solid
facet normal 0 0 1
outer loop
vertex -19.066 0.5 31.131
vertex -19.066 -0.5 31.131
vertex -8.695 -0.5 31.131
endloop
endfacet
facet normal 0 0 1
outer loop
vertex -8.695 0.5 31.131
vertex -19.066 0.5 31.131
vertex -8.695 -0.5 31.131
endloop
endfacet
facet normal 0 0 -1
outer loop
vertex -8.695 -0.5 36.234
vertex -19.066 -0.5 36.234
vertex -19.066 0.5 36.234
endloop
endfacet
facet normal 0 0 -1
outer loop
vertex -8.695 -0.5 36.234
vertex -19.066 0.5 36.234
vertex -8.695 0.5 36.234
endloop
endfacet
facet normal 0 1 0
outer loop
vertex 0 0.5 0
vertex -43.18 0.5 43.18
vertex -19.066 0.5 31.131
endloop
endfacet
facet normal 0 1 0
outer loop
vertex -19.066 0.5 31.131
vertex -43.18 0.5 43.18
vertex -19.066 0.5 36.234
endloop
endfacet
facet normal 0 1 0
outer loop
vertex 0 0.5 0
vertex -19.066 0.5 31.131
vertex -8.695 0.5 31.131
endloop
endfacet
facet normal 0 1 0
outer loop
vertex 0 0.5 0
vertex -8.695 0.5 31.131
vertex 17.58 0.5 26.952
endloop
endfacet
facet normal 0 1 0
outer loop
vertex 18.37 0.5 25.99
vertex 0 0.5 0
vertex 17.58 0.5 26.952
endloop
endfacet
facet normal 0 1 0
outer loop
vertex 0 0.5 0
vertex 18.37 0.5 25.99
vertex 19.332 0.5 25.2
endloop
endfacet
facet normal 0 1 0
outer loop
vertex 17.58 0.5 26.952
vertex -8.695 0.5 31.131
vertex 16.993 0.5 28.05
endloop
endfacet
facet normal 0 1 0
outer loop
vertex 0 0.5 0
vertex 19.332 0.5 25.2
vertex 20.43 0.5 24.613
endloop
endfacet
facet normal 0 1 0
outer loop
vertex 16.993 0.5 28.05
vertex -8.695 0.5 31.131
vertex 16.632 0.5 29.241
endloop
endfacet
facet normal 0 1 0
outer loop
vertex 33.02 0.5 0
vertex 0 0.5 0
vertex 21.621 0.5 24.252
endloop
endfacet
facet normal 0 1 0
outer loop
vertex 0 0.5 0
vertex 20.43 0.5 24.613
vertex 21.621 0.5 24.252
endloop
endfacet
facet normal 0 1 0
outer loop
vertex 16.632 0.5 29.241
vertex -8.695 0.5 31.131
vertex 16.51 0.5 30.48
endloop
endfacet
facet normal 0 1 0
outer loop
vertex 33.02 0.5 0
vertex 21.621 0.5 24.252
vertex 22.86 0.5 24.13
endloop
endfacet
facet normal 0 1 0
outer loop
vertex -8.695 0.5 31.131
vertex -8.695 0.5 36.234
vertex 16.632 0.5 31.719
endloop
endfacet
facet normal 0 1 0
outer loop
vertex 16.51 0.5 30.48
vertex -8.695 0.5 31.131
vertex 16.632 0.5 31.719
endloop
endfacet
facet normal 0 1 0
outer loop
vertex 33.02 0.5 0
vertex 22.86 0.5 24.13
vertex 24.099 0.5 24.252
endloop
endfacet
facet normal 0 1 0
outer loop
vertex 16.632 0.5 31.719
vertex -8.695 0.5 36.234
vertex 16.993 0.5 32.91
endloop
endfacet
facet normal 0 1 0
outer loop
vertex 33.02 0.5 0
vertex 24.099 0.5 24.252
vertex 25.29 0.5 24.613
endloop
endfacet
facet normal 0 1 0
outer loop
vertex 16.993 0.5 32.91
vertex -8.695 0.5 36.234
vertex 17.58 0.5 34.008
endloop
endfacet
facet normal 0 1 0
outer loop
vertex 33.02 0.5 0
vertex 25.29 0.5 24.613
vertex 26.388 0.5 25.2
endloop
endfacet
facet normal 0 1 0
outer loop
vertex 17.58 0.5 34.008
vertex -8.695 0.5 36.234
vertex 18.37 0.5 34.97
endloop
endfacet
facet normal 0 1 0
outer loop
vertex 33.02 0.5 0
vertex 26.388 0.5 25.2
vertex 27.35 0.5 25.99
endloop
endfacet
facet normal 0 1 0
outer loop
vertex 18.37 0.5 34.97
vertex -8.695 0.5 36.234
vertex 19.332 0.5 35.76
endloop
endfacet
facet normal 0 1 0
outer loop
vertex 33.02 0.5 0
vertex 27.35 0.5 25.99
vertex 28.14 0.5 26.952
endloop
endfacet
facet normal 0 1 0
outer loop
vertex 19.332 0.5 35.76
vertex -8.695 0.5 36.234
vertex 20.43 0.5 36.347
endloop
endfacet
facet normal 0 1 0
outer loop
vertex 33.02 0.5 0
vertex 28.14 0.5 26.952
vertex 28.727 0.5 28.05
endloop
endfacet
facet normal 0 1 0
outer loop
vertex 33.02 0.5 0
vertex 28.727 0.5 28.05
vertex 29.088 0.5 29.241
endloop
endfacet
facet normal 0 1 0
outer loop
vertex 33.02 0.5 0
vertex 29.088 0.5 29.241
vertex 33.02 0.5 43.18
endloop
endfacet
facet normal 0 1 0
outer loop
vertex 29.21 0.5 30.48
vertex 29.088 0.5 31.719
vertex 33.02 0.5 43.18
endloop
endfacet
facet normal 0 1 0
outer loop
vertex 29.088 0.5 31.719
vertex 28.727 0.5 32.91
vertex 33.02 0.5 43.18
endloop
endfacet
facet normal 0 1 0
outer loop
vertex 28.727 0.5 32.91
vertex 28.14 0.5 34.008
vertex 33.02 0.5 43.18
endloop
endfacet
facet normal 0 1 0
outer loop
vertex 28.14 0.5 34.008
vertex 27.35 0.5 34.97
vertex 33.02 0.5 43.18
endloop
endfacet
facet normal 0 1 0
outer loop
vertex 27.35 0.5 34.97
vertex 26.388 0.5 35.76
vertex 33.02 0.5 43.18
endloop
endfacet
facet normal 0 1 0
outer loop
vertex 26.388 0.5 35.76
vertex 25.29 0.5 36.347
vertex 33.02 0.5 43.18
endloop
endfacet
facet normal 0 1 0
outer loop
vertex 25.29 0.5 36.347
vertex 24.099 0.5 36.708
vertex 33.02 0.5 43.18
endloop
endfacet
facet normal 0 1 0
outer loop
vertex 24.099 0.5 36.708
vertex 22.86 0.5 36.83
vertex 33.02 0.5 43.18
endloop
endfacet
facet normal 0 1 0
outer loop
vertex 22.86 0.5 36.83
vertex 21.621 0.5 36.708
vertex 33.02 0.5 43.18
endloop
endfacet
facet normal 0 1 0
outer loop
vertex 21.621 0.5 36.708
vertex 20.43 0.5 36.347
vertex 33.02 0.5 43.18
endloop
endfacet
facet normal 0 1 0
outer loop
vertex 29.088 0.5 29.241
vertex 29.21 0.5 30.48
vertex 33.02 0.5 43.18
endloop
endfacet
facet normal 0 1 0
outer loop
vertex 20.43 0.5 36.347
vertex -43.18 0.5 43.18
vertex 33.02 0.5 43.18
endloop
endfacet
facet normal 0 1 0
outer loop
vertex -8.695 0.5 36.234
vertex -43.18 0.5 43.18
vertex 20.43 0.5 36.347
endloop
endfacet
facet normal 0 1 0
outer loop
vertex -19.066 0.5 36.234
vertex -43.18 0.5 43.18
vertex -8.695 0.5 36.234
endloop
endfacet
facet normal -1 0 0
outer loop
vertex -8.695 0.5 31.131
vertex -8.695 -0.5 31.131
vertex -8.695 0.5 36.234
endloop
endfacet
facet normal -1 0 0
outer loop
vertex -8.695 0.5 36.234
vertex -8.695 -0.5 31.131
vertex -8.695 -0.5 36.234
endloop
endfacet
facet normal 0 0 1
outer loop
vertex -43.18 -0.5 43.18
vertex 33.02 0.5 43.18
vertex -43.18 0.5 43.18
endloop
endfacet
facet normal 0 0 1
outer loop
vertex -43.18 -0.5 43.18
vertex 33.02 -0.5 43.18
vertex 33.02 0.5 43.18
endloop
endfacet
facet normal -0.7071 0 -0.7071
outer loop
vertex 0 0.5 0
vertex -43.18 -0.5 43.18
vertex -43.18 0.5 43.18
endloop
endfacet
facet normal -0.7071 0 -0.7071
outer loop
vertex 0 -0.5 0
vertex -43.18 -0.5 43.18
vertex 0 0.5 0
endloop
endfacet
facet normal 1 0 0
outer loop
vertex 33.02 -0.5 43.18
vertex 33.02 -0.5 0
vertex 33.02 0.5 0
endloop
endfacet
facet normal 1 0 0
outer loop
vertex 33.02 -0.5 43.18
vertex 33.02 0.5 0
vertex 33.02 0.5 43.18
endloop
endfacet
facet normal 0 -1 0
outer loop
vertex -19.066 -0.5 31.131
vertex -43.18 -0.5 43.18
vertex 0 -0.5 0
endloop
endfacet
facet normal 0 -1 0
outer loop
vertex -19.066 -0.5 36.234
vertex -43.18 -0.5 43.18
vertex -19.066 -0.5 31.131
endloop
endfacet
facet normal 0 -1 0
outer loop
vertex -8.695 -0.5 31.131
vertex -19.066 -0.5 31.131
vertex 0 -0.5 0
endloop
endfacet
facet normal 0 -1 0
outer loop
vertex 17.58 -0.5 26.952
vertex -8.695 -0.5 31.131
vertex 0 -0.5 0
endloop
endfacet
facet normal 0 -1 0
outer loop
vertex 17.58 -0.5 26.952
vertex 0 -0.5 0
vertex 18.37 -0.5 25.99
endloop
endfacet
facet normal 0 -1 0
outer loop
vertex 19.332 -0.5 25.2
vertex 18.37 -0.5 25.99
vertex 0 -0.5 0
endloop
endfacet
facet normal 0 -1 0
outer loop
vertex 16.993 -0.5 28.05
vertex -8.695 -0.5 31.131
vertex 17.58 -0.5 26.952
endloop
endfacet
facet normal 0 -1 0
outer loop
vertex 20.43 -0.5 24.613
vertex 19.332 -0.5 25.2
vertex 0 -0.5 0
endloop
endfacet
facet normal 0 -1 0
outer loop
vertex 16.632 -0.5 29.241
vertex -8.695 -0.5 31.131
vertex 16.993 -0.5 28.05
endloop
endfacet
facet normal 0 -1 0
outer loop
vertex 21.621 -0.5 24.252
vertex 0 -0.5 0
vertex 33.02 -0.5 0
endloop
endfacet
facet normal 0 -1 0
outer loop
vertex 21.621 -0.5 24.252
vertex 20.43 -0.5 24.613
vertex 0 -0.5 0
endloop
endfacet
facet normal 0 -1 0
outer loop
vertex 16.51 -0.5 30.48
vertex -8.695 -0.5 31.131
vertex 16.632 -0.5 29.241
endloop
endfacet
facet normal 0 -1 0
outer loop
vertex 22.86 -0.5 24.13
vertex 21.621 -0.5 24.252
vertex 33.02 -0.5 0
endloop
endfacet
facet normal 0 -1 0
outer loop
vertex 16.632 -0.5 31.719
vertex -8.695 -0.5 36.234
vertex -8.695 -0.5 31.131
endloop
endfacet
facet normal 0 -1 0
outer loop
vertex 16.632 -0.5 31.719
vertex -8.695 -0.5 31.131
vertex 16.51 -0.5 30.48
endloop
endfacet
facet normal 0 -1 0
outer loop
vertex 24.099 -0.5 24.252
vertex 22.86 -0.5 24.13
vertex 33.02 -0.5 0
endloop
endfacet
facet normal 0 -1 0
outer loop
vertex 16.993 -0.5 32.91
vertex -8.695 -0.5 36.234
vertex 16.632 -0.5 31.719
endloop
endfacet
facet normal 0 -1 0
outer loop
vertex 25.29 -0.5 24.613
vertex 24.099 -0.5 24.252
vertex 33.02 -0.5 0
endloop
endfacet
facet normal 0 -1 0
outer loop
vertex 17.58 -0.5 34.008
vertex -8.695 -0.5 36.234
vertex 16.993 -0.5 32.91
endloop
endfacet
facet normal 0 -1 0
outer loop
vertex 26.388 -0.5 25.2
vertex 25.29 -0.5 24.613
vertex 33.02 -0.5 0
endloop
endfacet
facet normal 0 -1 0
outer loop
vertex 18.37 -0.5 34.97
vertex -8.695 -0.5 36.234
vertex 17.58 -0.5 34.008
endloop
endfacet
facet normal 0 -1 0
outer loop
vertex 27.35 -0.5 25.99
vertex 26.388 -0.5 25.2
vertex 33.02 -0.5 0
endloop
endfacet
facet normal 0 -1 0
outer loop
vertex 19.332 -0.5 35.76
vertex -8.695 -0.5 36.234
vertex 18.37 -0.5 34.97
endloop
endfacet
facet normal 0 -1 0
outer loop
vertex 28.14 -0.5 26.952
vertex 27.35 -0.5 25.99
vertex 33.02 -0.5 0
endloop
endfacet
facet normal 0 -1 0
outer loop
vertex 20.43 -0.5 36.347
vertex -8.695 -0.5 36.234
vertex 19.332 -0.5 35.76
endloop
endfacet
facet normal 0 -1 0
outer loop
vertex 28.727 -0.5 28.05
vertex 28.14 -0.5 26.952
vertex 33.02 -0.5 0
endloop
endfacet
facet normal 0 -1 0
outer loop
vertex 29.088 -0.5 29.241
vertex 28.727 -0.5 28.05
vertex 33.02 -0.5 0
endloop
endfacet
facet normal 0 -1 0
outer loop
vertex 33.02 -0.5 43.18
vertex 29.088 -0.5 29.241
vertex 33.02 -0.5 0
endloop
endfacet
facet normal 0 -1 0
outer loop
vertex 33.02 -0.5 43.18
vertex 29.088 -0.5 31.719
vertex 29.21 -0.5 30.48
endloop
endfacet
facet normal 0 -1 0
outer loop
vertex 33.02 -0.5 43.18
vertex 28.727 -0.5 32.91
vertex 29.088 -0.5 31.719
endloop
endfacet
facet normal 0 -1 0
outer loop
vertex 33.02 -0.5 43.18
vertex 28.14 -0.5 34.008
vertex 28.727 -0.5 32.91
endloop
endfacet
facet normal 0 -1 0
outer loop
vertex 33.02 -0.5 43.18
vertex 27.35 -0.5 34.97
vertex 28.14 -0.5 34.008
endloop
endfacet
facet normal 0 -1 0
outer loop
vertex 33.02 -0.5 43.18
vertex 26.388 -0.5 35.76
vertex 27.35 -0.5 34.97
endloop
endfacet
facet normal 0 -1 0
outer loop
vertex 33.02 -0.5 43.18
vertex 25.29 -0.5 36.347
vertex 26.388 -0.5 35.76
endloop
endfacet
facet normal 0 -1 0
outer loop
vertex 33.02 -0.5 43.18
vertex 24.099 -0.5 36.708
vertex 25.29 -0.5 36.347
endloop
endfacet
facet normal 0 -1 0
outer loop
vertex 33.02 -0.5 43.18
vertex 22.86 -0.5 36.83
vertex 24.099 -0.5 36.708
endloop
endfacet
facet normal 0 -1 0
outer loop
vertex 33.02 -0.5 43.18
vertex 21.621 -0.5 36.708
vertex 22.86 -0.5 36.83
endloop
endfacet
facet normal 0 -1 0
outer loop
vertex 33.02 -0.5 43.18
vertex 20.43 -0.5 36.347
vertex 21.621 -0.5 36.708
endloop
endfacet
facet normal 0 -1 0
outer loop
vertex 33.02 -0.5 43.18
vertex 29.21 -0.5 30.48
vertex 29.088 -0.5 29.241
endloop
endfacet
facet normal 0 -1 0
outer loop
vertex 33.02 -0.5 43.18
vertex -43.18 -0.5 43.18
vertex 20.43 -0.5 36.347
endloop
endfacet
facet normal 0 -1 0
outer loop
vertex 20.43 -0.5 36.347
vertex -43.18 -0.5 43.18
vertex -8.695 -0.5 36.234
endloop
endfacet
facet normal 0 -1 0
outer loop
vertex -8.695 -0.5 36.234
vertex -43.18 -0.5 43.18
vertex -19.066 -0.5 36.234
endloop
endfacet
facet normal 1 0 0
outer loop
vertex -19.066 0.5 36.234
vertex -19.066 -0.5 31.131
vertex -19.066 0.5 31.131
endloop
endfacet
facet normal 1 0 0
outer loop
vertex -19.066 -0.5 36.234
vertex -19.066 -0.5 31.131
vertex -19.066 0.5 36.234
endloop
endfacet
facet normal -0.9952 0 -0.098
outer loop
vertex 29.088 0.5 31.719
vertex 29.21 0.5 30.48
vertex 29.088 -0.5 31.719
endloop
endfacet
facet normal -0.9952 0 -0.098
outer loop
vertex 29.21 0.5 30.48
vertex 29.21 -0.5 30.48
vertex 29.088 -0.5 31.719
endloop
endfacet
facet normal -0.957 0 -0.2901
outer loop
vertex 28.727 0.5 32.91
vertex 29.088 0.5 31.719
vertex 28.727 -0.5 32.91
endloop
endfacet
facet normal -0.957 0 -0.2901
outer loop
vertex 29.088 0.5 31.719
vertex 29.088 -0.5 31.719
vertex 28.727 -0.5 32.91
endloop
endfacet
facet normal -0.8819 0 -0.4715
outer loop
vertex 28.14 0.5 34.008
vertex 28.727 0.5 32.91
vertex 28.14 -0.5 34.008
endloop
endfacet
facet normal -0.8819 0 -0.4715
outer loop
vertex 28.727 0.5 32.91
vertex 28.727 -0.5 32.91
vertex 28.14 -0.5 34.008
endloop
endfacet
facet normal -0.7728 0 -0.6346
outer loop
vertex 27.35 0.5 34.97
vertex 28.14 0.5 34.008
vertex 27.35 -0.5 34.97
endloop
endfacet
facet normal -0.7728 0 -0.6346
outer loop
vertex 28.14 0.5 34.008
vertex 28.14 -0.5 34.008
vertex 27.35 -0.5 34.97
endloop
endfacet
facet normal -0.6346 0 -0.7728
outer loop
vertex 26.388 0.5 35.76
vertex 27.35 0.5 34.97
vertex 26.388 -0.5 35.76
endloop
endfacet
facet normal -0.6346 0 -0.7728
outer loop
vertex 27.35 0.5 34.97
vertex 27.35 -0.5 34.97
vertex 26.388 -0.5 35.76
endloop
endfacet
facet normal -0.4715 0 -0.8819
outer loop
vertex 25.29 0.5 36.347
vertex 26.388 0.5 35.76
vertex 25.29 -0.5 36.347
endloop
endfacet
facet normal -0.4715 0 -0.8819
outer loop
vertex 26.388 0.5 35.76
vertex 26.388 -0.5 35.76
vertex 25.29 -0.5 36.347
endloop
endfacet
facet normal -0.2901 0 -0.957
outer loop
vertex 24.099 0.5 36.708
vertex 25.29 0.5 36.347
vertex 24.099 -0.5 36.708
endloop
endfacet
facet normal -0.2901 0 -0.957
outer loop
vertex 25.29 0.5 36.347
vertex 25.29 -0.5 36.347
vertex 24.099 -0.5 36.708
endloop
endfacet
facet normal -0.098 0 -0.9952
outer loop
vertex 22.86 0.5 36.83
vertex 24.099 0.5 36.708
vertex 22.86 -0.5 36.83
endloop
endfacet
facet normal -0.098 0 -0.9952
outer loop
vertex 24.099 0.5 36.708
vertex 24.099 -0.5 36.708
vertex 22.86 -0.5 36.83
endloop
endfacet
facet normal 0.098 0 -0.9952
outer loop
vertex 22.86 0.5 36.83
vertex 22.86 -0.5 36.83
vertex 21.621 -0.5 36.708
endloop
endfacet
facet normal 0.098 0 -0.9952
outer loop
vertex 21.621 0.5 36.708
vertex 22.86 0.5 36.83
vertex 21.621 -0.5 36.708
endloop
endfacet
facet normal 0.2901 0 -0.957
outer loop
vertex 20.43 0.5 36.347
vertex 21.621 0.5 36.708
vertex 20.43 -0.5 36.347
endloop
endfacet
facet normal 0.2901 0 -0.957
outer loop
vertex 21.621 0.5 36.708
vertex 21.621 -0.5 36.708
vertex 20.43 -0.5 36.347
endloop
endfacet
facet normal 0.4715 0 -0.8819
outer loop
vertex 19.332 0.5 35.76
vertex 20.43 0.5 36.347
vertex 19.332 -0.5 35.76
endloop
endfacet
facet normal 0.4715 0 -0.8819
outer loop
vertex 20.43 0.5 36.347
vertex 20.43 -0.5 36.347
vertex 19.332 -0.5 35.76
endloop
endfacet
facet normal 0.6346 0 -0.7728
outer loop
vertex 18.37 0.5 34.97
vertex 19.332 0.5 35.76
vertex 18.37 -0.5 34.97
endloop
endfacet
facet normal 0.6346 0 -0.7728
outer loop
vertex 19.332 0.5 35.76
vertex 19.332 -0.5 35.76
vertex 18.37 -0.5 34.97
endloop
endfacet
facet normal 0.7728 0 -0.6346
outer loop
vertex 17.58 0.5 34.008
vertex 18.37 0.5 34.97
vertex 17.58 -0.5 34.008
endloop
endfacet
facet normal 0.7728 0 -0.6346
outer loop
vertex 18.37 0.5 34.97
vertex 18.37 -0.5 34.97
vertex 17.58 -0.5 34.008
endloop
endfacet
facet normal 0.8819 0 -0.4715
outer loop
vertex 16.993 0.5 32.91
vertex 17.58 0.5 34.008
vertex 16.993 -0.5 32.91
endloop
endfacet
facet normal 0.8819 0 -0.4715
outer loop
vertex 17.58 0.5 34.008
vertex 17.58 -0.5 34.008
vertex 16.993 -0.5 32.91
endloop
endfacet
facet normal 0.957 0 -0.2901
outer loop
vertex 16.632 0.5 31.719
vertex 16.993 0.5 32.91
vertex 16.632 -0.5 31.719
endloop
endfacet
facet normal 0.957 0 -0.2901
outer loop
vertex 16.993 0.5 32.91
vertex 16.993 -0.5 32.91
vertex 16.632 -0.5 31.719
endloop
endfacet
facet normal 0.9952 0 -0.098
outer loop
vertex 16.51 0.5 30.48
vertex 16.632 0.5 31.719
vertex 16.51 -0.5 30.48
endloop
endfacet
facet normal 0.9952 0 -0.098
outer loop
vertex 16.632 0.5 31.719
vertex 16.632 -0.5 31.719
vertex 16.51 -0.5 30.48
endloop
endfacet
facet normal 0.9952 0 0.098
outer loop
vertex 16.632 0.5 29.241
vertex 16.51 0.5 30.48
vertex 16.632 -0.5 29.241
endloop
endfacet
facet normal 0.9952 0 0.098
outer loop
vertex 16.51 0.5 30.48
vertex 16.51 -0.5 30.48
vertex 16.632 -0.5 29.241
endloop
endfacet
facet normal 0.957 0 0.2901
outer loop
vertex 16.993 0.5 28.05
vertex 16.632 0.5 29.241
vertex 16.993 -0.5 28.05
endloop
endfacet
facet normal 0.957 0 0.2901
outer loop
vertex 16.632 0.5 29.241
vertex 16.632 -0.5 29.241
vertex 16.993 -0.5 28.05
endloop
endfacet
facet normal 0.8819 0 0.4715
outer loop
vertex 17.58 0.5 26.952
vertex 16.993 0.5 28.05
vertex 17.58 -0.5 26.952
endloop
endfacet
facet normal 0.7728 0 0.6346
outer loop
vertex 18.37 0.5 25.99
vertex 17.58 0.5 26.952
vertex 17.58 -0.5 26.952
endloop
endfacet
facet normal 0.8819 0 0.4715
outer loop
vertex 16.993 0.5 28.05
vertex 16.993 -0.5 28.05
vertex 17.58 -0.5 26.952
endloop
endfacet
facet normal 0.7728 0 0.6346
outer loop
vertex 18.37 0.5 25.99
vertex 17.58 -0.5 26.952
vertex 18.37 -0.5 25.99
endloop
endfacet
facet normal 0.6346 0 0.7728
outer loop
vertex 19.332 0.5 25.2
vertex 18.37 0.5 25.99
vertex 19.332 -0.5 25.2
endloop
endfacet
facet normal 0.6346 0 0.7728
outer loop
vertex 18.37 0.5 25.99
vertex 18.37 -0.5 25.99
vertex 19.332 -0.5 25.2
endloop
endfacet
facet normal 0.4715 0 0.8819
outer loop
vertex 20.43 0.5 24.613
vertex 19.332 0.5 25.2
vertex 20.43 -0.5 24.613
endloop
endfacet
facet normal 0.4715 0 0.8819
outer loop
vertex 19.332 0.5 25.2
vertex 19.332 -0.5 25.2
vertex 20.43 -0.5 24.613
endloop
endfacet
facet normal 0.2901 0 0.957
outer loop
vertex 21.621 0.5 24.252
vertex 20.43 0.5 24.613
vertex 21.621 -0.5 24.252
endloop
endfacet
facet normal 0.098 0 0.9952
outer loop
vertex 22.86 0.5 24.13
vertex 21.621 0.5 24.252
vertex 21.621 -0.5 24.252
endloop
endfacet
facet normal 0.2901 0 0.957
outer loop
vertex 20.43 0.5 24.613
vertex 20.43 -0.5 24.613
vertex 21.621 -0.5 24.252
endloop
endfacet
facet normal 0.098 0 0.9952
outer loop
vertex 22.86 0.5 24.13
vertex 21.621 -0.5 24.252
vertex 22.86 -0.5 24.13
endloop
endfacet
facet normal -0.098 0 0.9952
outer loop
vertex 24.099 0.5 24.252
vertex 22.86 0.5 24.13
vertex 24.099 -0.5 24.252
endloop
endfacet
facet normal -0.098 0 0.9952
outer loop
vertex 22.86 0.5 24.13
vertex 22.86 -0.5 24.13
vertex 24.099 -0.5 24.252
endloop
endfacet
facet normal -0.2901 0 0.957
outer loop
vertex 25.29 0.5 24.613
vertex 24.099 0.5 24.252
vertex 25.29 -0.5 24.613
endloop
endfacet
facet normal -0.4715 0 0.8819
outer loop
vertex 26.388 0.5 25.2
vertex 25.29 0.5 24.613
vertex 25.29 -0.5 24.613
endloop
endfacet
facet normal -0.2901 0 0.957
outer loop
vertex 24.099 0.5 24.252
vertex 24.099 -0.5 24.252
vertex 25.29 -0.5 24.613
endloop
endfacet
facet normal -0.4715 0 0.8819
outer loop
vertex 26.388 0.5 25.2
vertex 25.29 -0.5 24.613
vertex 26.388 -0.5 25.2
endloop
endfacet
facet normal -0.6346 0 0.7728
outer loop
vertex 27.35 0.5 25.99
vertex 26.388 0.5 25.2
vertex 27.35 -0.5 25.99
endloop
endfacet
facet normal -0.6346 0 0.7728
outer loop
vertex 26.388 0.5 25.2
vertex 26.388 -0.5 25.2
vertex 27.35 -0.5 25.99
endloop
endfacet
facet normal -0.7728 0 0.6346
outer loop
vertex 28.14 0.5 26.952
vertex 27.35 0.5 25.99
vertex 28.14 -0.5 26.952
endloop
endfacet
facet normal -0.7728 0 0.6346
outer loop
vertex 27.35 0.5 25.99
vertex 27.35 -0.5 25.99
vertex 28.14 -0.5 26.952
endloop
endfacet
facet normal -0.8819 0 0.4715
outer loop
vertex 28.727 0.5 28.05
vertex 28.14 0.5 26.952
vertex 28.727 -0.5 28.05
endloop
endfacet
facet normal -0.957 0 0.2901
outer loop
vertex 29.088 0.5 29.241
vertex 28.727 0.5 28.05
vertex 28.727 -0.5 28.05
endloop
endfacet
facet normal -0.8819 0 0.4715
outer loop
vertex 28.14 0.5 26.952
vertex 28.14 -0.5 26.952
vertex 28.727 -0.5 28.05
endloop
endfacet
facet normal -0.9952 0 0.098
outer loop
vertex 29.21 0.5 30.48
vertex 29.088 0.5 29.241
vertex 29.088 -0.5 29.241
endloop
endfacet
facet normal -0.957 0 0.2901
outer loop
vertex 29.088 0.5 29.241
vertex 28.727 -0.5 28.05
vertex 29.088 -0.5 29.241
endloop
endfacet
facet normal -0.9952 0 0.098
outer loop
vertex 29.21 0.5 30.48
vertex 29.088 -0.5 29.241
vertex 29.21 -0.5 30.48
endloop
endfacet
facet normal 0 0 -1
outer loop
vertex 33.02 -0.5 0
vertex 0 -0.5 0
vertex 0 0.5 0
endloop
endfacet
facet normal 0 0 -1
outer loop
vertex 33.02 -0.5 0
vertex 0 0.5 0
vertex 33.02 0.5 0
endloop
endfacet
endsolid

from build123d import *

# Parameters (mm, degrees)
F1_DEPTH = 0.5
F2_R     = 6.35
F3_DEPTH = 12.7
F4_W     = 10.370853
F4_H     = 5.103117
F5_DEPTH = 12.7


with BuildPart() as f1:
    # F0 (on Front) → F1 (new body, symmetric)
    with BuildSketch(Plane.XZ):
        Polygon((-43.18, 43.18), (0, 0), (33.02, 0), (33.02, 43.18), align=None)
    extrude(amount=F1_DEPTH, both=True)

    # F2 (on Front) → F3 (cut, symmetric)
    with BuildSketch(Plane.XZ):
        with Locations((22.86, 30.48)):
            Circle(F2_R)
    extrude(amount=F3_DEPTH, both=True, mode=Mode.SUBTRACT)

    # F4 (on Front) → F5 (cut, symmetric)
    with BuildSketch(Plane.XZ):
        with Locations((-13.880418, 33.682564)):
            Rectangle(F4_W, F4_H)
    extrude(amount=F5_DEPTH, both=True, mode=Mode.SUBTRACT)


solid = f1.part
